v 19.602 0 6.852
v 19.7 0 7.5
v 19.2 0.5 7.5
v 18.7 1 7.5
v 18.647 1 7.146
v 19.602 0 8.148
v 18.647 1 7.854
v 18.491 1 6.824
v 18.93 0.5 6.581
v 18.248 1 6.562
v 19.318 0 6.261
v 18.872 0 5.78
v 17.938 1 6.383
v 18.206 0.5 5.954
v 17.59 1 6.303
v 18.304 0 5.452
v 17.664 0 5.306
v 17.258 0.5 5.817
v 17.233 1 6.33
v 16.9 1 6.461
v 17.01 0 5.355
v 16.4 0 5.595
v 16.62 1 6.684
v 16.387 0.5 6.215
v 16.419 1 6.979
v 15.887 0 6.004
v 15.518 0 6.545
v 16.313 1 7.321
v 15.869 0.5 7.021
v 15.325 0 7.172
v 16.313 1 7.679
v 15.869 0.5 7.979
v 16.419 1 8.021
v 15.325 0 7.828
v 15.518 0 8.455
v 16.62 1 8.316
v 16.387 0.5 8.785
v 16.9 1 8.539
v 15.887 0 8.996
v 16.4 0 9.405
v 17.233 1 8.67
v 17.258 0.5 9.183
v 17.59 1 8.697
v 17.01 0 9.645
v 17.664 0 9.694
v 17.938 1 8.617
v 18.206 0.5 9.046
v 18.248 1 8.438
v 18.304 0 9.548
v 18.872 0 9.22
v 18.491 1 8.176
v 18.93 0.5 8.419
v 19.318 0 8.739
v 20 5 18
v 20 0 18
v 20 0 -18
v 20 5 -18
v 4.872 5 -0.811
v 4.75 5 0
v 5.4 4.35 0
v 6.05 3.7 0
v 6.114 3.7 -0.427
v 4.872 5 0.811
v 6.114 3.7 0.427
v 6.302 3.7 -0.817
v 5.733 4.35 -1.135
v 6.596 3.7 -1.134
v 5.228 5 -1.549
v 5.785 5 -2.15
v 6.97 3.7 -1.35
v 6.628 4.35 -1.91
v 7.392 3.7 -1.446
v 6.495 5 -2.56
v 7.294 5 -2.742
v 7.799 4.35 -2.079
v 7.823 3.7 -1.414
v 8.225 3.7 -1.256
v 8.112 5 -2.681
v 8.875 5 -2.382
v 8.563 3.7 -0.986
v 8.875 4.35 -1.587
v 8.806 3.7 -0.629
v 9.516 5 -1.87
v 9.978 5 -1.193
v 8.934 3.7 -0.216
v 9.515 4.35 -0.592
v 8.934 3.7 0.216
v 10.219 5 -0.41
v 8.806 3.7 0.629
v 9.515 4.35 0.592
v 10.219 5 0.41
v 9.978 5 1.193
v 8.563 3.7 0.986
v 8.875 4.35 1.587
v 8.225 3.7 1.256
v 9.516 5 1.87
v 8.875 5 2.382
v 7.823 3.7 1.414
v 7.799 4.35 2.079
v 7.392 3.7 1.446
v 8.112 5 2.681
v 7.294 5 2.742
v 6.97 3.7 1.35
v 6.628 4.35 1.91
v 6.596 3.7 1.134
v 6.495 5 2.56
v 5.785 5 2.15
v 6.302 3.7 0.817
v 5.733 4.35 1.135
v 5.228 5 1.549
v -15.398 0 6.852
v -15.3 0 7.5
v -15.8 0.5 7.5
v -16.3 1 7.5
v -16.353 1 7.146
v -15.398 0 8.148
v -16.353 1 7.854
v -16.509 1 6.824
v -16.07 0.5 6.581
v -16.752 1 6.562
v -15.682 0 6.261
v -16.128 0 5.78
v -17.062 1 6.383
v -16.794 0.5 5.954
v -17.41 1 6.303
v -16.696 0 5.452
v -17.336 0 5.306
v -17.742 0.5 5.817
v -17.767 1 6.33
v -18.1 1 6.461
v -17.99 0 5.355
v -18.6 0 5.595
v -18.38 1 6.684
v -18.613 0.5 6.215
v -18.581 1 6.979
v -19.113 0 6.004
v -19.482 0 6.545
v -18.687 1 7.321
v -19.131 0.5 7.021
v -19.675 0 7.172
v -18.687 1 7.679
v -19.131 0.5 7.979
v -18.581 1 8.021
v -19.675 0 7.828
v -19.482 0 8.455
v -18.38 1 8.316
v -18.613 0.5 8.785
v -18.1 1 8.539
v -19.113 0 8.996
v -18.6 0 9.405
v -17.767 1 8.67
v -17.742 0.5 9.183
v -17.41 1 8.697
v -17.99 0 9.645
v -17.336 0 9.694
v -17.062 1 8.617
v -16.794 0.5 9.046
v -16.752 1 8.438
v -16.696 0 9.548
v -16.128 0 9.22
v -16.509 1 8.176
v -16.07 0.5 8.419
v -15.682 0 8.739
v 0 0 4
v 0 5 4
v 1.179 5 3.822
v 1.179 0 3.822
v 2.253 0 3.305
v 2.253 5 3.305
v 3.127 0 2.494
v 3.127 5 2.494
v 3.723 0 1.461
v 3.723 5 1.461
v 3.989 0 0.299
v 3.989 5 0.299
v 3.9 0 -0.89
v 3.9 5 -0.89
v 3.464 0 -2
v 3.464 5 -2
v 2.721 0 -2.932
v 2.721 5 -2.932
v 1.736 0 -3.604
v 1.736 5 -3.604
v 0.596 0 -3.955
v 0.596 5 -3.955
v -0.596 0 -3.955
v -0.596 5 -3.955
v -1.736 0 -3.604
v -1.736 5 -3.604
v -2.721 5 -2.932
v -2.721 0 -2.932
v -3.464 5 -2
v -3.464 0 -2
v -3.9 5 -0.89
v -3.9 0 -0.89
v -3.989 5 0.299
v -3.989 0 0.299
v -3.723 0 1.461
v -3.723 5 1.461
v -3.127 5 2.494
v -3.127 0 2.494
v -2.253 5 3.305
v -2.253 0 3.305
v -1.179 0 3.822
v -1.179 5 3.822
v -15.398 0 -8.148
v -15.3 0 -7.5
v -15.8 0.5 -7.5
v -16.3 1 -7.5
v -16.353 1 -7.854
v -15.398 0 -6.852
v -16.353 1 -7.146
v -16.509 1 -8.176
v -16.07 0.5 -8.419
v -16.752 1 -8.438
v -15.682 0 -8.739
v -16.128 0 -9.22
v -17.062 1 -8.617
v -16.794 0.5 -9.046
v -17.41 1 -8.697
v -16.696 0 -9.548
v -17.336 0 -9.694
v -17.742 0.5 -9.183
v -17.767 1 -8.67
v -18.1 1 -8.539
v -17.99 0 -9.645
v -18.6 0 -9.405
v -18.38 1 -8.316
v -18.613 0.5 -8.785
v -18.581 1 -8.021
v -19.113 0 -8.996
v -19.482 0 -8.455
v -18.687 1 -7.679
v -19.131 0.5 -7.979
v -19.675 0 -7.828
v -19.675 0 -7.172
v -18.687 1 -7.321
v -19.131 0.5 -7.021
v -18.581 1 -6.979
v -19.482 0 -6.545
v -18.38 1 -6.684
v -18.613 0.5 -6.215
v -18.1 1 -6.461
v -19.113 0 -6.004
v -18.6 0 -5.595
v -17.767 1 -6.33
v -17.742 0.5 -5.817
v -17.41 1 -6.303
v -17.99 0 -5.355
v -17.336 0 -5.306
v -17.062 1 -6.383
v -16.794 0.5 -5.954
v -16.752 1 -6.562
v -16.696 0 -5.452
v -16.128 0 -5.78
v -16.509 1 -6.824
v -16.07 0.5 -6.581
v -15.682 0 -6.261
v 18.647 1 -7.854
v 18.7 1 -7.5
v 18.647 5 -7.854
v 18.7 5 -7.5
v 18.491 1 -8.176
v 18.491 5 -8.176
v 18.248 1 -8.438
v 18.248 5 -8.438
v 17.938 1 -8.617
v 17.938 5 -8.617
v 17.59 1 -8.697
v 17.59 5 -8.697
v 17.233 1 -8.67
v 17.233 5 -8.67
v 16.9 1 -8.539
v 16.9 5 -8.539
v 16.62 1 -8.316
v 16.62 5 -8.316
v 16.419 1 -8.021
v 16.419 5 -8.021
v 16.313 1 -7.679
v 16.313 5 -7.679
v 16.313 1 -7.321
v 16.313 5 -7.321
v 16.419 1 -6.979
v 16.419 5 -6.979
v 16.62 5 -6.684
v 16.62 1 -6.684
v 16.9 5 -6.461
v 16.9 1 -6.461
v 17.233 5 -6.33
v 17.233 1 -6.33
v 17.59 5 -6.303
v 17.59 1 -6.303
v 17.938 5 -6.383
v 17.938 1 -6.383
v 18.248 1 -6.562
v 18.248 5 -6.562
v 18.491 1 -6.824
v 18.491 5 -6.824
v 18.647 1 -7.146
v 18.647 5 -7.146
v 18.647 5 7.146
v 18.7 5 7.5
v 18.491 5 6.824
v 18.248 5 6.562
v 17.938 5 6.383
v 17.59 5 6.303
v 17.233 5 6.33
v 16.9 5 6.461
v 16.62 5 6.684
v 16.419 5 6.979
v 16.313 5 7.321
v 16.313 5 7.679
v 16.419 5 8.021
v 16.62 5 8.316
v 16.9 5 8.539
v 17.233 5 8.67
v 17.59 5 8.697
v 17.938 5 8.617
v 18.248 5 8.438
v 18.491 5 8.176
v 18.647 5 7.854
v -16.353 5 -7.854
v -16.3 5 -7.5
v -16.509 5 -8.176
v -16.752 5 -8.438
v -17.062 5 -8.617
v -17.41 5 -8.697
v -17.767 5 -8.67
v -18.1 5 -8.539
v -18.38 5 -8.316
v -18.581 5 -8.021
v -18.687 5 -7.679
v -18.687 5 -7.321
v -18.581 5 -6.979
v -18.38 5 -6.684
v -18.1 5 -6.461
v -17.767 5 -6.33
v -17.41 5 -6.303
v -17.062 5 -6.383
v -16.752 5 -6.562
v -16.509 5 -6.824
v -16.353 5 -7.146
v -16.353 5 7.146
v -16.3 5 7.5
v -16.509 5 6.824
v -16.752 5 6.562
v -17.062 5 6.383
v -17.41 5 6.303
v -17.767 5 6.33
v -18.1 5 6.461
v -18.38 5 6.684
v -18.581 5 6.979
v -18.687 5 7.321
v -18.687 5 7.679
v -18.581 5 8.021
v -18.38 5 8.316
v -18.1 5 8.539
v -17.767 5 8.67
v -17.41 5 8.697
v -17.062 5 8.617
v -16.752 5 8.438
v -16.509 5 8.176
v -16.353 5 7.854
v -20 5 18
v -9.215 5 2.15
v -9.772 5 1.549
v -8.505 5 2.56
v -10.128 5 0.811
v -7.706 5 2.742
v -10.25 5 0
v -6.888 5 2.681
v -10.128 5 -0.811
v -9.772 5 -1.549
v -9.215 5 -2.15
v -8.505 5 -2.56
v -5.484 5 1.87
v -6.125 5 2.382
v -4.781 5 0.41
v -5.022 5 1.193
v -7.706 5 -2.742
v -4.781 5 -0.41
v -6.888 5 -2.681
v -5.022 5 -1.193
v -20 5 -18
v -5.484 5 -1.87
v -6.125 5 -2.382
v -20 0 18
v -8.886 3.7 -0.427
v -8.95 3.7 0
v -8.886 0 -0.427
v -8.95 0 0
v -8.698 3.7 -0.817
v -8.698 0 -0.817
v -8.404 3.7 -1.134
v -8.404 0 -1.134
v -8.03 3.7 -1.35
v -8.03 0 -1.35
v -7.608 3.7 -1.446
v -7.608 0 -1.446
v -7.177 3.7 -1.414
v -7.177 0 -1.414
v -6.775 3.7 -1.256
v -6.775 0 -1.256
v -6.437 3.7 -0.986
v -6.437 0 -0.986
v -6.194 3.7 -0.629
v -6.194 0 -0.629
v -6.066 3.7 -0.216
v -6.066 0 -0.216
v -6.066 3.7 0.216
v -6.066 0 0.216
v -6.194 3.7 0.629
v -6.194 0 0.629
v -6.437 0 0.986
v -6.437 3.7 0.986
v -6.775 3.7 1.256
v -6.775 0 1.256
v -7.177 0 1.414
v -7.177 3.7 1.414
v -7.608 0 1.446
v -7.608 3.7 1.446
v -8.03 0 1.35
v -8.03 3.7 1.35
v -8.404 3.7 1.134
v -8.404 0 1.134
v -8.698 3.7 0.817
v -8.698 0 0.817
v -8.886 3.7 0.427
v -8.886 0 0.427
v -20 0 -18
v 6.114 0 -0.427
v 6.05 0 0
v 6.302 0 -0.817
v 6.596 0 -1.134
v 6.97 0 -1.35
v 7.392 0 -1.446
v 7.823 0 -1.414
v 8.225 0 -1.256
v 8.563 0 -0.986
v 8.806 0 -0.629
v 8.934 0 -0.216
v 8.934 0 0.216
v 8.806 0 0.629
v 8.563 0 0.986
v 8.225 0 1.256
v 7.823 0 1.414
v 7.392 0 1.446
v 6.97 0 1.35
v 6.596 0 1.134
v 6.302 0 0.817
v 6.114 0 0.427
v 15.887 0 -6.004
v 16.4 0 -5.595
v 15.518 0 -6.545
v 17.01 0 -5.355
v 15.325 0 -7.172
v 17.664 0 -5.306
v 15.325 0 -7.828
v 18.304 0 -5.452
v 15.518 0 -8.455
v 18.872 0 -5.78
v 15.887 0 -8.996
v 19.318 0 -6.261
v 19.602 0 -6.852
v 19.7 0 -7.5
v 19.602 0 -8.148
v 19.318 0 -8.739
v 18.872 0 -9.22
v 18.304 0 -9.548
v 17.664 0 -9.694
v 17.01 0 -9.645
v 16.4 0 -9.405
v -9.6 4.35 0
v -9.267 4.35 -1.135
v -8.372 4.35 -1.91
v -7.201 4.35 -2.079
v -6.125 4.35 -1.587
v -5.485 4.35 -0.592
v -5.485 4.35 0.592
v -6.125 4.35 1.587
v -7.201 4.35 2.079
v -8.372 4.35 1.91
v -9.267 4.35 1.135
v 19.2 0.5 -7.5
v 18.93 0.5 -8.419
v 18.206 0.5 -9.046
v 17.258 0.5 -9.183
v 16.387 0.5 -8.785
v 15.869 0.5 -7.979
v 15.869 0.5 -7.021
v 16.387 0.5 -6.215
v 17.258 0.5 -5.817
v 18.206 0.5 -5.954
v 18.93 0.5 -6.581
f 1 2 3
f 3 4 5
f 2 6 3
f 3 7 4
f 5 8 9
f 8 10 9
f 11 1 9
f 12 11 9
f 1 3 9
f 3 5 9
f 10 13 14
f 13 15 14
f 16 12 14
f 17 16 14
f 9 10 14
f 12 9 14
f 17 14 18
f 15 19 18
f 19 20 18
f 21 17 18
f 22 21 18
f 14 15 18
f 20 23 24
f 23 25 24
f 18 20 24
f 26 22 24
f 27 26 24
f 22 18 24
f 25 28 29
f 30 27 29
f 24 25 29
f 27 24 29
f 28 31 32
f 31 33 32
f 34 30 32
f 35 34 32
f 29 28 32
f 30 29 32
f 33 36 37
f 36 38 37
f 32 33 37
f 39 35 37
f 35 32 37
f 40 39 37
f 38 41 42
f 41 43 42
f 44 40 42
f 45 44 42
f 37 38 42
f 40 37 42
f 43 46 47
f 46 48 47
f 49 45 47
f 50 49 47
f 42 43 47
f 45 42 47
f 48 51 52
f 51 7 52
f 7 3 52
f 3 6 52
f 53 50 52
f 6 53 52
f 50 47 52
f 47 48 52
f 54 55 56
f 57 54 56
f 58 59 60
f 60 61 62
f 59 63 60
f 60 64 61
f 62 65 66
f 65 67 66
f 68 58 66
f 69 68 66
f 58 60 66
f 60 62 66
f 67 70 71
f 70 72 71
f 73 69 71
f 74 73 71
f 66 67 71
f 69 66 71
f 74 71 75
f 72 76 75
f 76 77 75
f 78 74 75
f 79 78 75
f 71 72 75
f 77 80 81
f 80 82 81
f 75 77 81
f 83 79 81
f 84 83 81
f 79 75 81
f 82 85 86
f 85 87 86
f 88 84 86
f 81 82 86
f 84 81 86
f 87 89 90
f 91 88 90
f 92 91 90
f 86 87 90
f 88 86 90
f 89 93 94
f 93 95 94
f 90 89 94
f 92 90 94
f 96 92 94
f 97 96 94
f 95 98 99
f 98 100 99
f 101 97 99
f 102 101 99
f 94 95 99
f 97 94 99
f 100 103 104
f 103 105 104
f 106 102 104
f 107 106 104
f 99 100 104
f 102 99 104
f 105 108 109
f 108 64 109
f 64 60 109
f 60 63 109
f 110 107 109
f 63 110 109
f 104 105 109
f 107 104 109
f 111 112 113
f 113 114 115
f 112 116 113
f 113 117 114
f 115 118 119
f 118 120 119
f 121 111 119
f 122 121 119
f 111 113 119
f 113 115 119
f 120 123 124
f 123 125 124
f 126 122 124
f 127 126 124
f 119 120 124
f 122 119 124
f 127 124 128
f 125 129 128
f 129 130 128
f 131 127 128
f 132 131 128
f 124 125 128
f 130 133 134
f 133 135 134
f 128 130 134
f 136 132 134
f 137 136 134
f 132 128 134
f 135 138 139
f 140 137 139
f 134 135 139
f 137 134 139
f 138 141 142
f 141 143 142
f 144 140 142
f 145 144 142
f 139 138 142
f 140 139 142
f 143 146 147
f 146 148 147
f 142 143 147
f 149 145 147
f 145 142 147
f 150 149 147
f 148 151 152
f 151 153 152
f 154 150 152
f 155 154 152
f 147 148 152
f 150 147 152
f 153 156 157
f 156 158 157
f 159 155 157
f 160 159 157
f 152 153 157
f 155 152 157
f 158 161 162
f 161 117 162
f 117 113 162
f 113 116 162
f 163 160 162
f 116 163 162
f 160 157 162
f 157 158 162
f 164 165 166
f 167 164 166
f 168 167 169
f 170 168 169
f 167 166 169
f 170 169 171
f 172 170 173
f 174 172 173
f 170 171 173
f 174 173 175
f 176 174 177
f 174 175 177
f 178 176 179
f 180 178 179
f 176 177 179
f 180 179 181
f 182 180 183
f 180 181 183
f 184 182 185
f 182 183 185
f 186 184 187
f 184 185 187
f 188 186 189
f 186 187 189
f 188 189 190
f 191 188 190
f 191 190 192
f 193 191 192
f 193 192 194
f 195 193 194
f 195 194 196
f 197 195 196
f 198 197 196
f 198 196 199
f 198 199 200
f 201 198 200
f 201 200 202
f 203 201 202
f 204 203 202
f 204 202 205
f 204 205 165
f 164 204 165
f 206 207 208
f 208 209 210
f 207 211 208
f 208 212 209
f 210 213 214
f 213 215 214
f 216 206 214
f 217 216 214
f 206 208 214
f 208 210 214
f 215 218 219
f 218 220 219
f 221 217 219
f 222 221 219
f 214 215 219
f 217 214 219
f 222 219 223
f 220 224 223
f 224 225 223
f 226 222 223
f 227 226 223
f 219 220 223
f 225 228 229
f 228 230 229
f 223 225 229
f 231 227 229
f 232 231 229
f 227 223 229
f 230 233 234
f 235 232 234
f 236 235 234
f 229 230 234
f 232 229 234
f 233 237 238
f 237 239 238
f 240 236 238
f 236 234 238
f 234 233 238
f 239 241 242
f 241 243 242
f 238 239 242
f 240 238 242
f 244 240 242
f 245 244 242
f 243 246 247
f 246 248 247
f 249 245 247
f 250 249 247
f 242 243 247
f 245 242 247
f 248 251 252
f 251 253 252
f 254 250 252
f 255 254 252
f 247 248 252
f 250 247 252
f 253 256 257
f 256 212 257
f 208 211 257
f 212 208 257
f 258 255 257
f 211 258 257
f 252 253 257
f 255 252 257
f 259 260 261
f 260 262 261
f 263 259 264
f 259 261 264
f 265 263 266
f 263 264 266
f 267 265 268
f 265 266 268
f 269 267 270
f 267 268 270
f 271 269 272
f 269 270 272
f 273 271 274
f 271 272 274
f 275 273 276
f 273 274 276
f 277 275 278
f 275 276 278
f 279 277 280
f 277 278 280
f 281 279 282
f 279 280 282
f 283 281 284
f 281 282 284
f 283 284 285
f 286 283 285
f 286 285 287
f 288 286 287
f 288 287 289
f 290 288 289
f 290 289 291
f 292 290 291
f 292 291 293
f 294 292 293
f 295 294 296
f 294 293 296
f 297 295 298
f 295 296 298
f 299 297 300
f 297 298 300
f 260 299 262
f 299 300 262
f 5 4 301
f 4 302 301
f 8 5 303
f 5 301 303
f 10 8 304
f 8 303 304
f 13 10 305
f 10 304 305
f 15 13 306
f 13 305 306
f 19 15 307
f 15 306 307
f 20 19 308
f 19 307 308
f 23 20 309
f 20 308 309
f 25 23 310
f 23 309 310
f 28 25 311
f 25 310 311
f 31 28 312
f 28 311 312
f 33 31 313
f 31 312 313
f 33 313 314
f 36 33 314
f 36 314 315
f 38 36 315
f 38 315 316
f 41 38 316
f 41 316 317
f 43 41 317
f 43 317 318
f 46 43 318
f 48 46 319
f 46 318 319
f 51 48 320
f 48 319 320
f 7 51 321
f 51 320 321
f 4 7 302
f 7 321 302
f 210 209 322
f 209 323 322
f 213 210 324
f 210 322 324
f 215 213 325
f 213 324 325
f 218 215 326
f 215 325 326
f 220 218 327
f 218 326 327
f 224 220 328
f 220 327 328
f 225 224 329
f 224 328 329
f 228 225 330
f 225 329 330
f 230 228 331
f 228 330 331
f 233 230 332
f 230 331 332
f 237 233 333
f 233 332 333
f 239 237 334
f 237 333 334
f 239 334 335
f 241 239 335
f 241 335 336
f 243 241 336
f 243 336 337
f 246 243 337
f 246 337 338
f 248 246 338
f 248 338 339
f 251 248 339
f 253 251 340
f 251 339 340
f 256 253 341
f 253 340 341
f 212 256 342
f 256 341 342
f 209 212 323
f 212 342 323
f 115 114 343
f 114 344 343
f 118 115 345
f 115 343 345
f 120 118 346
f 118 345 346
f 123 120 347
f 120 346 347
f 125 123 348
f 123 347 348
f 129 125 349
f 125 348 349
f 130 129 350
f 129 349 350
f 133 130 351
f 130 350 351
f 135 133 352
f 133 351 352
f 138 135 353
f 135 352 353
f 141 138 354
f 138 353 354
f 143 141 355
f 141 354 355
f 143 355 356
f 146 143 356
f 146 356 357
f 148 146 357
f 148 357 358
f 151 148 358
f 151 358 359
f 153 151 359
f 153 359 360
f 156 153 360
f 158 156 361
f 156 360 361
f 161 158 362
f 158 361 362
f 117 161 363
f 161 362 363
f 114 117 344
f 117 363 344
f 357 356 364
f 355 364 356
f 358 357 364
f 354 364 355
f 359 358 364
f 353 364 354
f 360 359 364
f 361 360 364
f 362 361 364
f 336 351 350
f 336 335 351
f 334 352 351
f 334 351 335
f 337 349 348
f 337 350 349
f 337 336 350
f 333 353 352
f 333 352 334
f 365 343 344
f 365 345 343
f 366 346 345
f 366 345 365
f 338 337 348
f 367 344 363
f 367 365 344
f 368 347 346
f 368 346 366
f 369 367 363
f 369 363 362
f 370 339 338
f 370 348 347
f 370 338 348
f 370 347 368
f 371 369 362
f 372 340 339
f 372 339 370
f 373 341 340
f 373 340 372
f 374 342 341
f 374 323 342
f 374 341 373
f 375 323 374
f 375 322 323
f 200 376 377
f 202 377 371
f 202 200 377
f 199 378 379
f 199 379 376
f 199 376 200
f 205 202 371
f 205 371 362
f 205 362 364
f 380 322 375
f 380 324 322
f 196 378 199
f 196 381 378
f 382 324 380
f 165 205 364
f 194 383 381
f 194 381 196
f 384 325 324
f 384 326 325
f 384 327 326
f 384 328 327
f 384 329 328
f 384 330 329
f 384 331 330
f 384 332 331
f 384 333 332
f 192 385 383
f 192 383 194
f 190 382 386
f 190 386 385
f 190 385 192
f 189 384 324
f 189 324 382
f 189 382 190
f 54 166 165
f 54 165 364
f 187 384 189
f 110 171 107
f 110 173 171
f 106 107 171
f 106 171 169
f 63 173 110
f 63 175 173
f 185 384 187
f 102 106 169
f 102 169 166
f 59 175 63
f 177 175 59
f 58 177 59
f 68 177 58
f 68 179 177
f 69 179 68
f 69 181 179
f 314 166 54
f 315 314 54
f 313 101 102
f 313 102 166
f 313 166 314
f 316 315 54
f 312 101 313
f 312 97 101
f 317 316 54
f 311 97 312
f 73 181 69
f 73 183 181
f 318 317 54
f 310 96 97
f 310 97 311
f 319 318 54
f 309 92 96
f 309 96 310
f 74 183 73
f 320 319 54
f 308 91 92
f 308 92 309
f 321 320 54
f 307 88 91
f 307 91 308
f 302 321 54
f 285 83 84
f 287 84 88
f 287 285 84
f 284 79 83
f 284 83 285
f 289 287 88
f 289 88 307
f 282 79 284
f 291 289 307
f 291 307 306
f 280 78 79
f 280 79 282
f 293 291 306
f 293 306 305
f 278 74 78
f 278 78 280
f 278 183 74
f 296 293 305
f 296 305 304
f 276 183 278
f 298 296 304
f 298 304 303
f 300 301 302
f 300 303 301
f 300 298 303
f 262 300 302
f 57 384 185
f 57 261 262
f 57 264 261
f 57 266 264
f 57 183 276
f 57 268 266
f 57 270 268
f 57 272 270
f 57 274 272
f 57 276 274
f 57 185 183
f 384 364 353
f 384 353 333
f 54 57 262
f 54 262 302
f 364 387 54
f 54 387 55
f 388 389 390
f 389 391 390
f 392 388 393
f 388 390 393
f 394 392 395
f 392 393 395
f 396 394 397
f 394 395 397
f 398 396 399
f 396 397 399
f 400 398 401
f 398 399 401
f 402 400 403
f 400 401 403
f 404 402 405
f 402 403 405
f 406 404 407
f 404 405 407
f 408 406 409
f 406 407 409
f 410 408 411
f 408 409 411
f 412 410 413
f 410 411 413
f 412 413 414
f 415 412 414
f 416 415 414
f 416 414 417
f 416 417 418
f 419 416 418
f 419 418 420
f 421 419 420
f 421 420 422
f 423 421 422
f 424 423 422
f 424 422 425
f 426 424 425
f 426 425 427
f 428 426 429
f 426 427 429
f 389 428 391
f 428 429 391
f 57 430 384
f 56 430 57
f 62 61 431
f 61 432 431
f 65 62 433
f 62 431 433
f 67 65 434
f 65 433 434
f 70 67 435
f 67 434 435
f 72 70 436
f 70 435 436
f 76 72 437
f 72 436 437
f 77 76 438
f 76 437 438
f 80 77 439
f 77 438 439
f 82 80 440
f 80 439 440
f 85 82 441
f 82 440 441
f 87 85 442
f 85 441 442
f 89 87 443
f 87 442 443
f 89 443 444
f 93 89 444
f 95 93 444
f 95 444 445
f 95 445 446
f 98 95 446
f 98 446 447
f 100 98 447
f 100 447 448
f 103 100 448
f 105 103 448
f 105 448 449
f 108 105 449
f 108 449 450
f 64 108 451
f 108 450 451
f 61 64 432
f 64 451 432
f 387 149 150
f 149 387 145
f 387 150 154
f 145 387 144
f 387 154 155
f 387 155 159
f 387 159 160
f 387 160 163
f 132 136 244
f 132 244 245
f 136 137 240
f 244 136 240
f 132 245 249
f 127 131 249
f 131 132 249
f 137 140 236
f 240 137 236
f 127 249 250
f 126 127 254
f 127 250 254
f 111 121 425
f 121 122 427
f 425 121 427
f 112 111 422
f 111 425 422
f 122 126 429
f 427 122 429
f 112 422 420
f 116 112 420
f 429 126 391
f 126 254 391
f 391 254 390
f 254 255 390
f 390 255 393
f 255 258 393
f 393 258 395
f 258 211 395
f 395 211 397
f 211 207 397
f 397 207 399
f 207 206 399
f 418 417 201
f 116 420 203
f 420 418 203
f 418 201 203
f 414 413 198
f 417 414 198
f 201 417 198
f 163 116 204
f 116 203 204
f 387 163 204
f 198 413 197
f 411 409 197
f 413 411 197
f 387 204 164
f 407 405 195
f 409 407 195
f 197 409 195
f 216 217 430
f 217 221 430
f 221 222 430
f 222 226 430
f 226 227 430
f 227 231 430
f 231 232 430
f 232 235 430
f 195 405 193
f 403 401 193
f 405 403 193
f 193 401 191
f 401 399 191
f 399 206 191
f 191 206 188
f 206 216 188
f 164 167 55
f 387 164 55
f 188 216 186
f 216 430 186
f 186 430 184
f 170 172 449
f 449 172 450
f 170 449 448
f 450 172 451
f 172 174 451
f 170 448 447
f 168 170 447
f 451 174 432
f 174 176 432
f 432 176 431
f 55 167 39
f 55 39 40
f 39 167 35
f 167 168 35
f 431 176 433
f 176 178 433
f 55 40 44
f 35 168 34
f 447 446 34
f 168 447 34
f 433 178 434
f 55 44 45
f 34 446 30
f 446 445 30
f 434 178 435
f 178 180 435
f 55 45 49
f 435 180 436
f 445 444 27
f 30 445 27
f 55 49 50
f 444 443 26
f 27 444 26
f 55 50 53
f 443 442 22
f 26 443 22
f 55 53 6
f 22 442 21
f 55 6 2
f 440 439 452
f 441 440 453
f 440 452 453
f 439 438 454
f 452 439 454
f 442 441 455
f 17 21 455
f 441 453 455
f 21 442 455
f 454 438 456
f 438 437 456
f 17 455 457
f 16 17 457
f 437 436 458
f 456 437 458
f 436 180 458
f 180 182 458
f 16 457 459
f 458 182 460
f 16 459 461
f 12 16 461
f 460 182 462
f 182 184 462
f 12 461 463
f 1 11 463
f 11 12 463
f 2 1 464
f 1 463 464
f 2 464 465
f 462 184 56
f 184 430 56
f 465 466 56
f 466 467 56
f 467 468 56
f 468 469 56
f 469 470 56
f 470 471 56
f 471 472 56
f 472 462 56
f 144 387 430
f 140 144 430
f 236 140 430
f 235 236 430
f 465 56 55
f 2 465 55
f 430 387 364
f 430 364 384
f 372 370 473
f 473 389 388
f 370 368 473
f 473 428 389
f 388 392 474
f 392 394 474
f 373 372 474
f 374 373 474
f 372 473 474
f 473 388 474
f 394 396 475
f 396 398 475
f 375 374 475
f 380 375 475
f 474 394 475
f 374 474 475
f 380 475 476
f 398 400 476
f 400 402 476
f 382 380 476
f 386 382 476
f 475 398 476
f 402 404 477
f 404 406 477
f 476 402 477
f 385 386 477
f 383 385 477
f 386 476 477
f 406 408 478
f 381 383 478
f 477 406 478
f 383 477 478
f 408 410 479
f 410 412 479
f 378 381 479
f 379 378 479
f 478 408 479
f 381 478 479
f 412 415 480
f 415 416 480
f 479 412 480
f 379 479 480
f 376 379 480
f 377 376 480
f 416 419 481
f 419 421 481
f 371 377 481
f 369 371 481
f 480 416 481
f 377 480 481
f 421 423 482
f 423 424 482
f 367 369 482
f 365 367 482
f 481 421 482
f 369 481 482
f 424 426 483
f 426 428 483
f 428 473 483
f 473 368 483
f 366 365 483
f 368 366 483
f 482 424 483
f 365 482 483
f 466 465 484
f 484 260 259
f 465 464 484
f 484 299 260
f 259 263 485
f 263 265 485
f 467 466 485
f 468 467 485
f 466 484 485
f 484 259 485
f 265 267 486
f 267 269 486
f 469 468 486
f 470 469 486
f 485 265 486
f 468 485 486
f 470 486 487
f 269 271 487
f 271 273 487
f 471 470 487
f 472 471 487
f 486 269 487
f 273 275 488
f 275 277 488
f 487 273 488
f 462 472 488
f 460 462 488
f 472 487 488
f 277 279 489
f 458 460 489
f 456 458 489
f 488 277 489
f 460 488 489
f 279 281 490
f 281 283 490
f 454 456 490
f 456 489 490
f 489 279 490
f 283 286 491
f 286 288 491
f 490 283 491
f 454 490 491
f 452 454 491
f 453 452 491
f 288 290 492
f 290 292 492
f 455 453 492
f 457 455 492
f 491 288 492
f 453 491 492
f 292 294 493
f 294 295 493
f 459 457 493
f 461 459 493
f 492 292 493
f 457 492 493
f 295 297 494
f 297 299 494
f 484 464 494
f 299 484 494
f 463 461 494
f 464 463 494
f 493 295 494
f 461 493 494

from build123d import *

# Parameters (mm, degrees)
SKETCH1_W                                            = 40
SKETCH1_H                                            = 36
BOSS_EXTRUDE1_DEPTH                                  = 5
SKETCH2_R                                            = 4
CUT_EXTRUDE1_DEPTH                                   = 28.367864367
CSK_FOR_M2_5_COUNTERSUNK_FLAT_HEAD_SCREW_D           = 2.9
CSK_FOR_M2_5_COUNTERSUNK_FLAT_HEAD_SCREW_CSINK_D     = 5.5
CSK_FOR_M2_5_COUNTERSUNK_FLAT_HEAD_SCREW_CSINK_ANGLE = 90
CSK_FOR_M2_COUNTERSUNK_FLAT_HEAD_SCREW1_D            = 2.4
CSK_FOR_M2_COUNTERSUNK_FLAT_HEAD_SCREW1_CSINK_D      = 4.4
CSK_FOR_M2_COUNTERSUNK_FLAT_HEAD_SCREW1_CSINK_ANGLE  = 90


with BuildPart() as part:
    # Sketch1 → Boss-Extrude1 (new body)
    with BuildSketch(Plane(origin=(0, 0, 0), x_dir=(1, 0, 0), z_dir=(0, 1, 0))):
        Rectangle(SKETCH1_W, SKETCH1_H)
    extrude(amount=BOSS_EXTRUDE1_DEPTH)

    # Sketch2 → Cut-Extrude1 (cut, through all)
    with BuildSketch(Plane(origin=(0, 5, 0), x_dir=(1, 0, 0), z_dir=(0, 1, 0))):
        with Locations(Location((0, 0, 0), (0, 0, 270))):
            Circle(SKETCH2_R)
    extrude(amount=-CUT_EXTRUDE1_DEPTH, mode=Mode.SUBTRACT)

    # CSK for M2.5 Countersunk Flat Head Screw1 (through all)
    with Locations(Plane(origin=(0, 5, 0), x_dir=(1, 0, 0), z_dir=(0, 1, 0))):
        with Locations((-7.5, 0), (7.5, 0)):
            CounterSinkHole(CSK_FOR_M2_5_COUNTERSUNK_FLAT_HEAD_SCREW_D / 2, CSK_FOR_M2_5_COUNTERSUNK_FLAT_HEAD_SCREW_CSINK_D / 2, counter_sink_angle=CSK_FOR_M2_5_COUNTERSUNK_FLAT_HEAD_SCREW_CSINK_ANGLE)

    # CSK for M2 Countersunk Flat Head Screw1 (through all)
    with Locations(Plane(origin=(0, 0, 0), x_dir=(-1, 0, 0), z_dir=(0, -1, 0))):
        with Locations((17.5, -7.5), (17.5, 7.5), (-17.5, 7.5), (-17.5, -7.5)):
            CounterSinkHole(CSK_FOR_M2_COUNTERSUNK_FLAT_HEAD_SCREW1_D / 2, CSK_FOR_M2_COUNTERSUNK_FLAT_HEAD_SCREW1_CSINK_D / 2, counter_sink_angle=CSK_FOR_M2_COUNTERSUNK_FLAT_HEAD_SCREW1_CSINK_ANGLE)


solid = part.part
